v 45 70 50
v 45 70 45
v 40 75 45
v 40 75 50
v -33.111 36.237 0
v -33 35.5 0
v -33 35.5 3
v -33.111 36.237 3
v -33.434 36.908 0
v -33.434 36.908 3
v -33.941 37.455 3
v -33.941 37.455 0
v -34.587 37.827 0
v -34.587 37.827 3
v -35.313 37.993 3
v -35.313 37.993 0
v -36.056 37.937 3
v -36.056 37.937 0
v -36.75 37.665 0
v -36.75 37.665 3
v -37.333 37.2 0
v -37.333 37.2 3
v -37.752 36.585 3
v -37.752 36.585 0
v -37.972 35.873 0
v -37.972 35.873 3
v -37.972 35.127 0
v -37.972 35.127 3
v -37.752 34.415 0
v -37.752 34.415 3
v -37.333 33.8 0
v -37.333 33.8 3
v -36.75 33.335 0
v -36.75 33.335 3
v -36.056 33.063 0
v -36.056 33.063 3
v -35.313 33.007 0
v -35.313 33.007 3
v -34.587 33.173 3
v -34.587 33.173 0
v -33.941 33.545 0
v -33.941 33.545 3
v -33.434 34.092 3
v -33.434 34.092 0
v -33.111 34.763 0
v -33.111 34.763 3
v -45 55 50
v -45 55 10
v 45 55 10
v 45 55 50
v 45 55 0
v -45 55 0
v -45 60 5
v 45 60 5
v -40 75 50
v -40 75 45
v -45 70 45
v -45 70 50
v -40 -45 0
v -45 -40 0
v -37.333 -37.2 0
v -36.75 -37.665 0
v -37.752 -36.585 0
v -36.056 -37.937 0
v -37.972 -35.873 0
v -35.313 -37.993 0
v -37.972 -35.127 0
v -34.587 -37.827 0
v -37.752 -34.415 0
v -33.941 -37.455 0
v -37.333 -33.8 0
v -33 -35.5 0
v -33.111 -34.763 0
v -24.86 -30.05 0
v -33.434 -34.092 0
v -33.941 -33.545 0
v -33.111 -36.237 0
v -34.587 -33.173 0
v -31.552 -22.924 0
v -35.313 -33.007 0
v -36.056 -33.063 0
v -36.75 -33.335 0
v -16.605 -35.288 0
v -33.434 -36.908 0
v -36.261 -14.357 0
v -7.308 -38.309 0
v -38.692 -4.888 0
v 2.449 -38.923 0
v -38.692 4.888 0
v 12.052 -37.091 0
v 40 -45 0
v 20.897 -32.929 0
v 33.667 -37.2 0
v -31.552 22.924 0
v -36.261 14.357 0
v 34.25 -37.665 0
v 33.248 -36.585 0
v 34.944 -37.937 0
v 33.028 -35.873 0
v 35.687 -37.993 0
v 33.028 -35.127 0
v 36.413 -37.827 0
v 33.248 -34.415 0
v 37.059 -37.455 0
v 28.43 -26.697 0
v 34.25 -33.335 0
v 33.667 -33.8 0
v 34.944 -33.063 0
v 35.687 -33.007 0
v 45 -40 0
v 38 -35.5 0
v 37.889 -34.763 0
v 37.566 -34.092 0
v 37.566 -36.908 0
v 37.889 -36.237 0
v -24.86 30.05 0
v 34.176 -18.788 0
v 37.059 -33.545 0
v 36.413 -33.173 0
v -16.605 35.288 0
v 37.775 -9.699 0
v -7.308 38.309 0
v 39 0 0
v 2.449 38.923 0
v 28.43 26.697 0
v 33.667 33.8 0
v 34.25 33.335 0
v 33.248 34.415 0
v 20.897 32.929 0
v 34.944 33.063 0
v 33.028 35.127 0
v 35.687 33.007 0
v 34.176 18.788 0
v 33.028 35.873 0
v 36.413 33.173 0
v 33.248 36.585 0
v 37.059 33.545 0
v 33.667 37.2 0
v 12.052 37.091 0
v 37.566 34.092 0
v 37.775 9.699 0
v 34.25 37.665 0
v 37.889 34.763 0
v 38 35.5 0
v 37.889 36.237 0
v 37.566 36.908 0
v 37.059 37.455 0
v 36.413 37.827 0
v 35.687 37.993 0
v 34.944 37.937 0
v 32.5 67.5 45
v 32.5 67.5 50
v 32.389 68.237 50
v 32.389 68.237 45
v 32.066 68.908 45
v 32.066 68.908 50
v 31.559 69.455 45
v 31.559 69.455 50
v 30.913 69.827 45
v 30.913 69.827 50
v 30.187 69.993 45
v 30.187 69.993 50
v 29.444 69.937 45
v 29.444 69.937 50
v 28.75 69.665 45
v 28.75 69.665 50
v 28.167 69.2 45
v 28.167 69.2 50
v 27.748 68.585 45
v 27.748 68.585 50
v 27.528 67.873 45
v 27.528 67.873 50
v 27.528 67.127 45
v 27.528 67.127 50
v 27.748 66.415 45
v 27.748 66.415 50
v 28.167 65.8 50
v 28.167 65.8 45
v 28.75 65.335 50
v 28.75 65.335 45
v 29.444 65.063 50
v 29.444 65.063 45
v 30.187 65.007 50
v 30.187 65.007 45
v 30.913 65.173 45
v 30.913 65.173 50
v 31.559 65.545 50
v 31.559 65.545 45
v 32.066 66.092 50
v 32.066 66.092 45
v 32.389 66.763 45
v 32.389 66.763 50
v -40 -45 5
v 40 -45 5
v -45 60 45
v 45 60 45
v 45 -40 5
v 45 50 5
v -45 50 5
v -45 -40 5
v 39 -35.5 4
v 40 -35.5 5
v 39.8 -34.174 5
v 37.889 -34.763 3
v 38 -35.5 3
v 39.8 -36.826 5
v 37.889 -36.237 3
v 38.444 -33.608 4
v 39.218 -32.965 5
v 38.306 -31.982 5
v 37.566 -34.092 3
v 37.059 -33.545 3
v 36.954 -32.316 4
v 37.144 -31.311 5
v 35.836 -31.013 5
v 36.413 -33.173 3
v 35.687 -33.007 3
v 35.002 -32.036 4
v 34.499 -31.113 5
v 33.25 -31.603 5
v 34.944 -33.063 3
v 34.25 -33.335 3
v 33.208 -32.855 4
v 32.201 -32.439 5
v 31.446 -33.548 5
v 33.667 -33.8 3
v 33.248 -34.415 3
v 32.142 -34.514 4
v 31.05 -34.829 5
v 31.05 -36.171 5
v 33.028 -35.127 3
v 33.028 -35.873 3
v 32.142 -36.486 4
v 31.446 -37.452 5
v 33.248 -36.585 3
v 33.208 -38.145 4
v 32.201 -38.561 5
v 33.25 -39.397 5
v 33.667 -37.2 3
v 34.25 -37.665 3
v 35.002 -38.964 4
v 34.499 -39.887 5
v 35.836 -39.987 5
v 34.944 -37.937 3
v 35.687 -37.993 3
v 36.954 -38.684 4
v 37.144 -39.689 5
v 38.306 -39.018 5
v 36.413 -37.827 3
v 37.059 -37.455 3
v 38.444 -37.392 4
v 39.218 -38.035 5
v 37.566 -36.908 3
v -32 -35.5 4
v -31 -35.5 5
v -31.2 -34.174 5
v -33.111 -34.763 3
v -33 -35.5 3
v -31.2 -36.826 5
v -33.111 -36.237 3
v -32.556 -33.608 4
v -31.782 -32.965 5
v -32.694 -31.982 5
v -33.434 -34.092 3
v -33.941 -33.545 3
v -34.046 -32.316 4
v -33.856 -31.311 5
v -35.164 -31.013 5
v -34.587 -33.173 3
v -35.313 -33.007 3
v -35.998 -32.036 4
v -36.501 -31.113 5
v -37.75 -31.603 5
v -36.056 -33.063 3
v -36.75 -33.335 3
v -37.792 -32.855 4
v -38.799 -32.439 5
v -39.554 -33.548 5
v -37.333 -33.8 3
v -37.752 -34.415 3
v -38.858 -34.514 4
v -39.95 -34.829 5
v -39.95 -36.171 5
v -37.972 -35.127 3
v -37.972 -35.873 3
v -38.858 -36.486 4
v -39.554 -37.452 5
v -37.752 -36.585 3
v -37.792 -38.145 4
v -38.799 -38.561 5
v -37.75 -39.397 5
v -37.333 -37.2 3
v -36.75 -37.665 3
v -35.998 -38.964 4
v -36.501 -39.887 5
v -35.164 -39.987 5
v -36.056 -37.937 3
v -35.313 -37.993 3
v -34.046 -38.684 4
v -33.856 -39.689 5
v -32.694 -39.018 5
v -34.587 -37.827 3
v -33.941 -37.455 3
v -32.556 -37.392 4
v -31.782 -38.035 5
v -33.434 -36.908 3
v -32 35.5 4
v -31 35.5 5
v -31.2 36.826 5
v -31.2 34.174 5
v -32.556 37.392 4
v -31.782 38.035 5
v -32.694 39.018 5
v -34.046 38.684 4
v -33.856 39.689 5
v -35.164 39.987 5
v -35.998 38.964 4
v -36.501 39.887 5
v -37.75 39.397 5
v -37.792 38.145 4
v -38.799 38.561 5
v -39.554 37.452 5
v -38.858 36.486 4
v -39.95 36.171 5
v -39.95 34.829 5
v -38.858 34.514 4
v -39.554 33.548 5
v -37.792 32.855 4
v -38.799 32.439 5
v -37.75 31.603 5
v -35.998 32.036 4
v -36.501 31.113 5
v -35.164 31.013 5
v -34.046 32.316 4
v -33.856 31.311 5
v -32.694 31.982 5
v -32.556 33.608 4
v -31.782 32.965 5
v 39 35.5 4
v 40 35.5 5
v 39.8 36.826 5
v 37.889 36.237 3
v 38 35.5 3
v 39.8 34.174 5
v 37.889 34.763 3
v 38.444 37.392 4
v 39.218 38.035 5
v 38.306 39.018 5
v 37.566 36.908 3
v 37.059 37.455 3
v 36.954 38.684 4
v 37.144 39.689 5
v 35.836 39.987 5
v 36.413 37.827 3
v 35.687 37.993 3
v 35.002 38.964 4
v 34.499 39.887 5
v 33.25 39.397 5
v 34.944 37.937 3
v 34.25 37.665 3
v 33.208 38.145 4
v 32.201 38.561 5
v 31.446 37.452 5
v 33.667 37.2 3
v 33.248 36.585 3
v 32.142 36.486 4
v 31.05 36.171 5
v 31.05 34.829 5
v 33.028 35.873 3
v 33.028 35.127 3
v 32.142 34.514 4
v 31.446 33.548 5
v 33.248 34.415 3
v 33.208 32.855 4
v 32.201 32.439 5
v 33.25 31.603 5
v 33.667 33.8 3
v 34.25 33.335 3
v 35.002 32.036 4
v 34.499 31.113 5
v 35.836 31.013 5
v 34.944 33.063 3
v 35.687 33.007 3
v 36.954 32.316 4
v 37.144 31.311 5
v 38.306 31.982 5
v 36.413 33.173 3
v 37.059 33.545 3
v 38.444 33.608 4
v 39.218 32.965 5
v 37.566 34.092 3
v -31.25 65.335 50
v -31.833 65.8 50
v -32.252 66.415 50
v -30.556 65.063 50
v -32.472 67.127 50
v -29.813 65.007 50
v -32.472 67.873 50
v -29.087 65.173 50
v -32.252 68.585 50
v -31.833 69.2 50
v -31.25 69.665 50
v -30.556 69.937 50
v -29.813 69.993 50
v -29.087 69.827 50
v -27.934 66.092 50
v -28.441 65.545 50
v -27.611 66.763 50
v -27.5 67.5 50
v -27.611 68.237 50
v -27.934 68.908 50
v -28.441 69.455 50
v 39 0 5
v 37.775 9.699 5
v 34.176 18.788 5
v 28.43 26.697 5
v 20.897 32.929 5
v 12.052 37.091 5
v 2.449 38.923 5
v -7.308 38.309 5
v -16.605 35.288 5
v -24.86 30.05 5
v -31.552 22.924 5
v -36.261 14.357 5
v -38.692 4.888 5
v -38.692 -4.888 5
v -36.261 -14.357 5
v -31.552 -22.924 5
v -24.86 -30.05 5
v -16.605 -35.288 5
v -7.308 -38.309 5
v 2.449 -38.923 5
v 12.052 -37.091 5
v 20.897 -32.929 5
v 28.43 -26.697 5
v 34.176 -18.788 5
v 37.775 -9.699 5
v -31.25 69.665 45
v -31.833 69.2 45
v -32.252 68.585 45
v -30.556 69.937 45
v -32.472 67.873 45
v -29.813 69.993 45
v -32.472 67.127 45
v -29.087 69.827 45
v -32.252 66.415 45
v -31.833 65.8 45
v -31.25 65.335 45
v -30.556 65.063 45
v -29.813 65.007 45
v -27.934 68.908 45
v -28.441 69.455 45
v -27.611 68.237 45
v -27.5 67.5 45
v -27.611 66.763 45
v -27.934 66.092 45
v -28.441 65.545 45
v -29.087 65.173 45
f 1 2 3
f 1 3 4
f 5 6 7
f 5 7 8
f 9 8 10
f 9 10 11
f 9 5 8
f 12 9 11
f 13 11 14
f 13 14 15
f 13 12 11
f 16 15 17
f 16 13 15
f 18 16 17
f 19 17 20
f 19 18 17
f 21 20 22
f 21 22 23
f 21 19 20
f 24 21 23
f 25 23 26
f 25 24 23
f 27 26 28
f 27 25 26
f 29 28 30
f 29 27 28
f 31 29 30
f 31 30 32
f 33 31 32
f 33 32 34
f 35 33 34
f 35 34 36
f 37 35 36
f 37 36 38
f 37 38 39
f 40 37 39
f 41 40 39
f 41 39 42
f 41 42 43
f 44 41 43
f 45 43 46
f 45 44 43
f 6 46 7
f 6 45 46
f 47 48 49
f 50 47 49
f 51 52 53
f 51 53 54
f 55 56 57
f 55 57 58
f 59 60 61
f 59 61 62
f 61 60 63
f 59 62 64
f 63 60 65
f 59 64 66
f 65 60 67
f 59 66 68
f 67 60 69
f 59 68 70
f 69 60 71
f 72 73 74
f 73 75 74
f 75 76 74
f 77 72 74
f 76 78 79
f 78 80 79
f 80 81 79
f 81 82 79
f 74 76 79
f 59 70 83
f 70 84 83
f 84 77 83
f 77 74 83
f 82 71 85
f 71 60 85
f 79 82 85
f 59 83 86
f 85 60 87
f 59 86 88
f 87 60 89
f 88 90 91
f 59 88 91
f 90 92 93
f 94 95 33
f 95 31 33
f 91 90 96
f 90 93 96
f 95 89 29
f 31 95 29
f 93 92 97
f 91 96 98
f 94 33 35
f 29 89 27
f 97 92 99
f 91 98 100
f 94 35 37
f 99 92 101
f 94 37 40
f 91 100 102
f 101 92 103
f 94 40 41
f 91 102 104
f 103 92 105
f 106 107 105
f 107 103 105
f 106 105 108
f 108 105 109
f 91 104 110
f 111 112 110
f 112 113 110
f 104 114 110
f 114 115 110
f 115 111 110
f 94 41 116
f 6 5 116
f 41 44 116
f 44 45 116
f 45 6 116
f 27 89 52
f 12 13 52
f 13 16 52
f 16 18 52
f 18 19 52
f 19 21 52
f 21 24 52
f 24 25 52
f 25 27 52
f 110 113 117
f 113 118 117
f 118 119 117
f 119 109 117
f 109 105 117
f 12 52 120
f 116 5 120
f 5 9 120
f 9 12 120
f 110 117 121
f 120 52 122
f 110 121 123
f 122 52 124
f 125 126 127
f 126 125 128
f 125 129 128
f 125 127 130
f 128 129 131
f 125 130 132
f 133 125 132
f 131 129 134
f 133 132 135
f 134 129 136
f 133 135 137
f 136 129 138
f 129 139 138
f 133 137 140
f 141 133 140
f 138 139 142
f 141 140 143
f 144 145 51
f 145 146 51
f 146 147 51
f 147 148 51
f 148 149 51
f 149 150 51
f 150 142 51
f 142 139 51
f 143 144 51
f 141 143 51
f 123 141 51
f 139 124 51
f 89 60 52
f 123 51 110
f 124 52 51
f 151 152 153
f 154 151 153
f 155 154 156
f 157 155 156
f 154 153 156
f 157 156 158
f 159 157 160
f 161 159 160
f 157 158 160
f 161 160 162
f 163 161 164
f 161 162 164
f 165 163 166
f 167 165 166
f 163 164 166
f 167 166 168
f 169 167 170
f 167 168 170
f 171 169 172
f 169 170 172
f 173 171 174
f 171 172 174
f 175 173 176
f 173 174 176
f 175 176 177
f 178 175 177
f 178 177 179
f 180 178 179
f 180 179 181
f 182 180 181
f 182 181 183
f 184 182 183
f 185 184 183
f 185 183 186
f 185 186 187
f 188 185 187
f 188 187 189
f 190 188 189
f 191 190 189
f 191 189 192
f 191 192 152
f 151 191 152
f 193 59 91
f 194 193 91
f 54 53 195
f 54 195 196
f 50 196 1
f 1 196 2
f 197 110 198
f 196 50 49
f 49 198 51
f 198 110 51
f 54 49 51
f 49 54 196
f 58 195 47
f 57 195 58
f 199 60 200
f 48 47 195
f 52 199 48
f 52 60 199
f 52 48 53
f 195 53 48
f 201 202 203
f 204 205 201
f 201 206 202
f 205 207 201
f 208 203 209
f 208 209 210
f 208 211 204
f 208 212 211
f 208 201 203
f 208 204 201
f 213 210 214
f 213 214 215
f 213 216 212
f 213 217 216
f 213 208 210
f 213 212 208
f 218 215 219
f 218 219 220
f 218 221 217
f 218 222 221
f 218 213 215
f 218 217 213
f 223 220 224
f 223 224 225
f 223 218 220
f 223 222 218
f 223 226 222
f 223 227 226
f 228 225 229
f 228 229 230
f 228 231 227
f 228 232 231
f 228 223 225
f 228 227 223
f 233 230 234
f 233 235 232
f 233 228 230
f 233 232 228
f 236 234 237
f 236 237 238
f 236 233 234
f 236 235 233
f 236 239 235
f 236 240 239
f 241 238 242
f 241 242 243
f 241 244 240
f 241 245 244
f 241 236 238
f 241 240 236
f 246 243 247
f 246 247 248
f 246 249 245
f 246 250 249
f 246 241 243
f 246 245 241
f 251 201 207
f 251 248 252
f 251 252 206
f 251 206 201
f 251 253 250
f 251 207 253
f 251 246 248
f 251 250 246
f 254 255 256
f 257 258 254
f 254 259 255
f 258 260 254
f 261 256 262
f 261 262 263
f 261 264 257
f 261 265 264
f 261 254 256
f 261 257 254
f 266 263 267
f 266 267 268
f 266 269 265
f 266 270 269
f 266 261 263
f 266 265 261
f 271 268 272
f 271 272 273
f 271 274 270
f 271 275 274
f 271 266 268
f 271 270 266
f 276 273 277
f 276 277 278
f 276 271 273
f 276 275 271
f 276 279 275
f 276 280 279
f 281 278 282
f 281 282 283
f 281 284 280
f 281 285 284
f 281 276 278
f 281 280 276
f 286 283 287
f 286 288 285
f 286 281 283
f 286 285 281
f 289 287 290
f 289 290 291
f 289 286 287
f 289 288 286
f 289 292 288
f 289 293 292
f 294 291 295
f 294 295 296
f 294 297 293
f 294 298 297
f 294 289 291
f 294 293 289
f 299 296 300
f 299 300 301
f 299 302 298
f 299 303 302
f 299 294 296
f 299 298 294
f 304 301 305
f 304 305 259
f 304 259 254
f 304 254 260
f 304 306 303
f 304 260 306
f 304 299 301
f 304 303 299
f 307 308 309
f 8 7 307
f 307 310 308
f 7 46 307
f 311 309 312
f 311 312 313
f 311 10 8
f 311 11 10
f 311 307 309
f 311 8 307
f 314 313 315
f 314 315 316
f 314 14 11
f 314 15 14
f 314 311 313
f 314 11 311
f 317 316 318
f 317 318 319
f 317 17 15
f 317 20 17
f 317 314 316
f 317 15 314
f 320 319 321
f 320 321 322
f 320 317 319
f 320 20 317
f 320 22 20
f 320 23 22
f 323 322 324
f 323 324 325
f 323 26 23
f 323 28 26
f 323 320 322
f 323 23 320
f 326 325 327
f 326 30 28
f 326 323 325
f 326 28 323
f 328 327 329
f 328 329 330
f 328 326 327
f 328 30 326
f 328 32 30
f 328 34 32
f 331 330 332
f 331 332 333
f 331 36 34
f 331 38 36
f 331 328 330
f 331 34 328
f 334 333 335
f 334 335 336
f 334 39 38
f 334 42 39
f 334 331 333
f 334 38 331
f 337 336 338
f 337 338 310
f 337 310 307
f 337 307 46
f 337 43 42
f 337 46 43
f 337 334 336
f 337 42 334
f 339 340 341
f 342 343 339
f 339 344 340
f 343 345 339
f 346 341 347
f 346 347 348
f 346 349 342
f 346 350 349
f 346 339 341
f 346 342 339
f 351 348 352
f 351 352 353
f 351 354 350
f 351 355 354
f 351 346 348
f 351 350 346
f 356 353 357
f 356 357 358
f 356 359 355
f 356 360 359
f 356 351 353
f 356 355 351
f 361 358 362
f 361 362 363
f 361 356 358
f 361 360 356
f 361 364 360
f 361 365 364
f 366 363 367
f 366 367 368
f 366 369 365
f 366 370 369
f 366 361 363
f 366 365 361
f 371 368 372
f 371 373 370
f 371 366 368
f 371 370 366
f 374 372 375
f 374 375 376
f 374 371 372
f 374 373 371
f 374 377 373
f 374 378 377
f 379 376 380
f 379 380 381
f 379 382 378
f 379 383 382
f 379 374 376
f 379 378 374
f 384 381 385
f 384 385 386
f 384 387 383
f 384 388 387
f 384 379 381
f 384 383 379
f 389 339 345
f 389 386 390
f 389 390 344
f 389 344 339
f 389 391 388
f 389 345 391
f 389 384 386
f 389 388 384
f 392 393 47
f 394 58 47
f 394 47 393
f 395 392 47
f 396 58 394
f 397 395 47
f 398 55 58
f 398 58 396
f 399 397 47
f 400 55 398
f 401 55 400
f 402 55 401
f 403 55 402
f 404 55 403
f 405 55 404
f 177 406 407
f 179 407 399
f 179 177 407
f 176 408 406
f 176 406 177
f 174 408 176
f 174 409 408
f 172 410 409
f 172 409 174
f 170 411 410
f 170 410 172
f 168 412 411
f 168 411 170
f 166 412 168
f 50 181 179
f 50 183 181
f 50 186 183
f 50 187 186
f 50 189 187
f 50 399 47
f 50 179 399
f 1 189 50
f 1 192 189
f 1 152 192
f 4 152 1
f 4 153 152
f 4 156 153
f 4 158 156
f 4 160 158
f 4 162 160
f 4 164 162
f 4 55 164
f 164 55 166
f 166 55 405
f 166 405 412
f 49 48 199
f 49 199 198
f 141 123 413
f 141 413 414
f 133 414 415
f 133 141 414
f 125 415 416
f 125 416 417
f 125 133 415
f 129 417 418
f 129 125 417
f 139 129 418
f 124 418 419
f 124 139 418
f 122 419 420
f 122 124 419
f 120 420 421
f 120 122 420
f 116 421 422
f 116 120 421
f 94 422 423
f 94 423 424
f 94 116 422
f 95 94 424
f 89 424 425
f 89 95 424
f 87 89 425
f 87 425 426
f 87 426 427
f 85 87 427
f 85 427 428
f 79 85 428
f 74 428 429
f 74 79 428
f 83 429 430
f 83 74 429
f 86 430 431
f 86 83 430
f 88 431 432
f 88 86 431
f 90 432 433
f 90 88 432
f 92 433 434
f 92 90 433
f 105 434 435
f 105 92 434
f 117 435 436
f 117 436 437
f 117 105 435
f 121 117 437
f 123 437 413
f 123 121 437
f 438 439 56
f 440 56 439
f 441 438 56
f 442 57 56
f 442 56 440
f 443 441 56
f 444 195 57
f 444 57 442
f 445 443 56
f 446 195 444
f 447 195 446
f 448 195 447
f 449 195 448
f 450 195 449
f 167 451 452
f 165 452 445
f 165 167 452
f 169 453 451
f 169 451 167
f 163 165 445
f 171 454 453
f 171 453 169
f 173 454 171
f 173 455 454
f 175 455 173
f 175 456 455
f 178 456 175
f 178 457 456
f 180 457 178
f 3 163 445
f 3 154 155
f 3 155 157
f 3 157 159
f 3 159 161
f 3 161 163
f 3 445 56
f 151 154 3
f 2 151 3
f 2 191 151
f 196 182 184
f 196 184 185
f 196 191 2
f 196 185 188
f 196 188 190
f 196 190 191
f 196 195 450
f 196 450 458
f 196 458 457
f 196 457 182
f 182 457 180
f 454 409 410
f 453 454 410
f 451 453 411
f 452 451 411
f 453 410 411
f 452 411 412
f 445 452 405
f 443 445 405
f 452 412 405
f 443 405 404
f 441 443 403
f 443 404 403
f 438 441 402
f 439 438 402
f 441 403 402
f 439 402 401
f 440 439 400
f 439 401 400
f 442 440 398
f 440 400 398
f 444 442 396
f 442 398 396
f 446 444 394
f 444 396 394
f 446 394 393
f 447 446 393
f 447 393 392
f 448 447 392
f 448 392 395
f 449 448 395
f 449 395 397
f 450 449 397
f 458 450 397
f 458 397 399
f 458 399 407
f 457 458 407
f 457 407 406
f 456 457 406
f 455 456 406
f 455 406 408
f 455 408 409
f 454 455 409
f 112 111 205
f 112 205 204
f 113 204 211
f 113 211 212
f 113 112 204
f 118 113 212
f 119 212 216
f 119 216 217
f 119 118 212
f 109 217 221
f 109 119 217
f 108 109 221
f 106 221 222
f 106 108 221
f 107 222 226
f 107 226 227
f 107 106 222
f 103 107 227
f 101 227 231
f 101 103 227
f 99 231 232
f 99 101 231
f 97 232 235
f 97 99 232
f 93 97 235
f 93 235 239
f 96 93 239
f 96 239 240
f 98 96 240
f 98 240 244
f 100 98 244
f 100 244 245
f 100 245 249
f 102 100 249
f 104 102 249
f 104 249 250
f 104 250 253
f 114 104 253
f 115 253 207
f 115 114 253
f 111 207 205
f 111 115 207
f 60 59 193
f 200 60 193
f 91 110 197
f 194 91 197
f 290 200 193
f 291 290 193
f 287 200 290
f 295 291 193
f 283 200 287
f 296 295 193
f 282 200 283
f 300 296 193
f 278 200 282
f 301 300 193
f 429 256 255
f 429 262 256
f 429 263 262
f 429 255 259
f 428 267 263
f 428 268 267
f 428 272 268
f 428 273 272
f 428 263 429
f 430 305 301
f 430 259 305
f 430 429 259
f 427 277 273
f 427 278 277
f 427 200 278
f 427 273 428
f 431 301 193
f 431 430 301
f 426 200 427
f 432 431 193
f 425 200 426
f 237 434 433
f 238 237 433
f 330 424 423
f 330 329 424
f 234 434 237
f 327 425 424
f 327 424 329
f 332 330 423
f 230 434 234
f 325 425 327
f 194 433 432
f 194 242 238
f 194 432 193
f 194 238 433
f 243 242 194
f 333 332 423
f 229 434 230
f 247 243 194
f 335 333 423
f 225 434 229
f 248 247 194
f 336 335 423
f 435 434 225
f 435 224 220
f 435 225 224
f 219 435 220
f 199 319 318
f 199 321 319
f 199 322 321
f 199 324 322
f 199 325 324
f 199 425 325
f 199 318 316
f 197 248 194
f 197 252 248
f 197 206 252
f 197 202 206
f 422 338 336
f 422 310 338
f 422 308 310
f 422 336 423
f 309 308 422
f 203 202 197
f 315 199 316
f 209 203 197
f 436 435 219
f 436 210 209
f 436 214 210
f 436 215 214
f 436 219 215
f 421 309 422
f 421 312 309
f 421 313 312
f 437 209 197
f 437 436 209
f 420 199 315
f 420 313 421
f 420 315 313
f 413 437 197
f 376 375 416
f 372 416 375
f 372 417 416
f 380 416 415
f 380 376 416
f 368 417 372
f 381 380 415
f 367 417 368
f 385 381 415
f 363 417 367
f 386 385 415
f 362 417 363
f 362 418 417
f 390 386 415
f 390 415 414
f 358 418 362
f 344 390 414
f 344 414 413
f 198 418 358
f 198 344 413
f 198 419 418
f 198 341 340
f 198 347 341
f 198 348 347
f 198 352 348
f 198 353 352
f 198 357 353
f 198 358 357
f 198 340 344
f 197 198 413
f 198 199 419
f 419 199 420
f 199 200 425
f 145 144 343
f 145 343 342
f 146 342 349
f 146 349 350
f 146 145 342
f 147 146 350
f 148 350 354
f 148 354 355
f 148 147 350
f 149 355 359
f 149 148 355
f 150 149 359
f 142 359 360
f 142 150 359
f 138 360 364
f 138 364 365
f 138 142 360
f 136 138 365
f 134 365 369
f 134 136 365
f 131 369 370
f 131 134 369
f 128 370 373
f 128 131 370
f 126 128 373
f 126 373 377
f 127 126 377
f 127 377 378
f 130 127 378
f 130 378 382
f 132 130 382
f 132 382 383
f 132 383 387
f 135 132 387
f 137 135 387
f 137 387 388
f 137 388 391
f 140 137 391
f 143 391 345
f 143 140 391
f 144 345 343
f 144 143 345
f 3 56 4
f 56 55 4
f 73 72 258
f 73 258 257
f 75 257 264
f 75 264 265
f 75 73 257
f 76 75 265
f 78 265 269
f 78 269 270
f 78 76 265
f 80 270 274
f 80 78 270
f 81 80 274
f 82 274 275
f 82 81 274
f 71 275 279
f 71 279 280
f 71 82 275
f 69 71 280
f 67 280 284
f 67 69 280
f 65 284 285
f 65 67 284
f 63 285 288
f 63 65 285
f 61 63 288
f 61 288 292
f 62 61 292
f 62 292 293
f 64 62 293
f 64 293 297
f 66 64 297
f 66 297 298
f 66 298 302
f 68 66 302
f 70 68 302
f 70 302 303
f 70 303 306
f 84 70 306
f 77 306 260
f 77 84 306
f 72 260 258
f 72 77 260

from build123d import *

# Parameters (mm, degrees)
F0_W     = 90
F0_H     = 90
F0_W_2   = 80
F0_H_2   = 80
F0_R     = 2.5
F0_R_2   = 39
F0_H_3   = 10
F1_DEPTH = 5
F0_H_4   = 5
F2_DEPTH = 50
F3_W     = 90
F3_H     = 5
F4_DEPTH = 20
F5_R     = 2.5
F6_DEPTH = 10
F7_SIZE  = 5
F8_SIZE  = 2


with BuildPart() as f1:
    # F0 (on Top) → F1 (new body)
    with BuildSketch(Plane.XY):
        Rectangle(F0_W, F0_H)
        Rectangle(F0_W_2, F0_H_2, mode=Mode.SUBTRACT)
        Rectangle(F0_W_2, F0_H_2)
        with Locations((-35.5, -35.5)):
            Circle(F0_R, mode=Mode.SUBTRACT)
        with Locations((35.5, -35.5)):
            Circle(F0_R, mode=Mode.SUBTRACT)
        Circle(F0_R_2, mode=Mode.SUBTRACT)
        with Locations((-35.5, 35.5)):
            Circle(F0_R, mode=Mode.SUBTRACT)
        with Locations((35.5, 35.5)):
            Circle(F0_R, mode=Mode.SUBTRACT)
        with Locations((0, 50)):
            Rectangle(F0_W, F0_H_3)
    extrude(amount=F1_DEPTH)

    # F0 (on Top) → F2 (join)
    with BuildSketch(Plane.XY):
        with Locations((0, 57.5)):
            Rectangle(F0_W, F0_H_4)
    extrude(amount=F2_DEPTH)

    # F3 (on face) → F4 (join)
    with BuildSketch(Plane.XZ.offset(-55)):
        with Locations((0, 47.5)):
            Rectangle(F3_W, F3_H)
    extrude(amount=-F4_DEPTH)

    # F5 (on face) → F6 (cut)
    with BuildSketch(Plane.XY.offset(50)):
        with Locations((30, 67.5)):
            Circle(F5_R)
        with Locations((-30, 67.5)):
            Circle(F5_R)
    extrude(amount=-F6_DEPTH, mode=Mode.SUBTRACT)

    # F7
    f7_edges = [f1.edges().sort_by_distance(p)[0] for p in [
        (-45, -45, 2.5),
        (45, -45, 2.5),
        (45, 75, 47.5),
        (-45, 75, 47.5),
        (0, 55, 5),
        (0, 60, 0),
    ]]
    chamfer(f7_edges, length=F7_SIZE)

    # F8
    f8_edges = [f1.edges().sort_by_distance(p)[0] for p in [
        (-38, -35.5, 5),
        (33, -35.5, 5),
        (33, 35.5, 5),
        (-38, 35.5, 5),
    ]]
    chamfer(f8_edges, length=F8_SIZE)


solid = f1.part
